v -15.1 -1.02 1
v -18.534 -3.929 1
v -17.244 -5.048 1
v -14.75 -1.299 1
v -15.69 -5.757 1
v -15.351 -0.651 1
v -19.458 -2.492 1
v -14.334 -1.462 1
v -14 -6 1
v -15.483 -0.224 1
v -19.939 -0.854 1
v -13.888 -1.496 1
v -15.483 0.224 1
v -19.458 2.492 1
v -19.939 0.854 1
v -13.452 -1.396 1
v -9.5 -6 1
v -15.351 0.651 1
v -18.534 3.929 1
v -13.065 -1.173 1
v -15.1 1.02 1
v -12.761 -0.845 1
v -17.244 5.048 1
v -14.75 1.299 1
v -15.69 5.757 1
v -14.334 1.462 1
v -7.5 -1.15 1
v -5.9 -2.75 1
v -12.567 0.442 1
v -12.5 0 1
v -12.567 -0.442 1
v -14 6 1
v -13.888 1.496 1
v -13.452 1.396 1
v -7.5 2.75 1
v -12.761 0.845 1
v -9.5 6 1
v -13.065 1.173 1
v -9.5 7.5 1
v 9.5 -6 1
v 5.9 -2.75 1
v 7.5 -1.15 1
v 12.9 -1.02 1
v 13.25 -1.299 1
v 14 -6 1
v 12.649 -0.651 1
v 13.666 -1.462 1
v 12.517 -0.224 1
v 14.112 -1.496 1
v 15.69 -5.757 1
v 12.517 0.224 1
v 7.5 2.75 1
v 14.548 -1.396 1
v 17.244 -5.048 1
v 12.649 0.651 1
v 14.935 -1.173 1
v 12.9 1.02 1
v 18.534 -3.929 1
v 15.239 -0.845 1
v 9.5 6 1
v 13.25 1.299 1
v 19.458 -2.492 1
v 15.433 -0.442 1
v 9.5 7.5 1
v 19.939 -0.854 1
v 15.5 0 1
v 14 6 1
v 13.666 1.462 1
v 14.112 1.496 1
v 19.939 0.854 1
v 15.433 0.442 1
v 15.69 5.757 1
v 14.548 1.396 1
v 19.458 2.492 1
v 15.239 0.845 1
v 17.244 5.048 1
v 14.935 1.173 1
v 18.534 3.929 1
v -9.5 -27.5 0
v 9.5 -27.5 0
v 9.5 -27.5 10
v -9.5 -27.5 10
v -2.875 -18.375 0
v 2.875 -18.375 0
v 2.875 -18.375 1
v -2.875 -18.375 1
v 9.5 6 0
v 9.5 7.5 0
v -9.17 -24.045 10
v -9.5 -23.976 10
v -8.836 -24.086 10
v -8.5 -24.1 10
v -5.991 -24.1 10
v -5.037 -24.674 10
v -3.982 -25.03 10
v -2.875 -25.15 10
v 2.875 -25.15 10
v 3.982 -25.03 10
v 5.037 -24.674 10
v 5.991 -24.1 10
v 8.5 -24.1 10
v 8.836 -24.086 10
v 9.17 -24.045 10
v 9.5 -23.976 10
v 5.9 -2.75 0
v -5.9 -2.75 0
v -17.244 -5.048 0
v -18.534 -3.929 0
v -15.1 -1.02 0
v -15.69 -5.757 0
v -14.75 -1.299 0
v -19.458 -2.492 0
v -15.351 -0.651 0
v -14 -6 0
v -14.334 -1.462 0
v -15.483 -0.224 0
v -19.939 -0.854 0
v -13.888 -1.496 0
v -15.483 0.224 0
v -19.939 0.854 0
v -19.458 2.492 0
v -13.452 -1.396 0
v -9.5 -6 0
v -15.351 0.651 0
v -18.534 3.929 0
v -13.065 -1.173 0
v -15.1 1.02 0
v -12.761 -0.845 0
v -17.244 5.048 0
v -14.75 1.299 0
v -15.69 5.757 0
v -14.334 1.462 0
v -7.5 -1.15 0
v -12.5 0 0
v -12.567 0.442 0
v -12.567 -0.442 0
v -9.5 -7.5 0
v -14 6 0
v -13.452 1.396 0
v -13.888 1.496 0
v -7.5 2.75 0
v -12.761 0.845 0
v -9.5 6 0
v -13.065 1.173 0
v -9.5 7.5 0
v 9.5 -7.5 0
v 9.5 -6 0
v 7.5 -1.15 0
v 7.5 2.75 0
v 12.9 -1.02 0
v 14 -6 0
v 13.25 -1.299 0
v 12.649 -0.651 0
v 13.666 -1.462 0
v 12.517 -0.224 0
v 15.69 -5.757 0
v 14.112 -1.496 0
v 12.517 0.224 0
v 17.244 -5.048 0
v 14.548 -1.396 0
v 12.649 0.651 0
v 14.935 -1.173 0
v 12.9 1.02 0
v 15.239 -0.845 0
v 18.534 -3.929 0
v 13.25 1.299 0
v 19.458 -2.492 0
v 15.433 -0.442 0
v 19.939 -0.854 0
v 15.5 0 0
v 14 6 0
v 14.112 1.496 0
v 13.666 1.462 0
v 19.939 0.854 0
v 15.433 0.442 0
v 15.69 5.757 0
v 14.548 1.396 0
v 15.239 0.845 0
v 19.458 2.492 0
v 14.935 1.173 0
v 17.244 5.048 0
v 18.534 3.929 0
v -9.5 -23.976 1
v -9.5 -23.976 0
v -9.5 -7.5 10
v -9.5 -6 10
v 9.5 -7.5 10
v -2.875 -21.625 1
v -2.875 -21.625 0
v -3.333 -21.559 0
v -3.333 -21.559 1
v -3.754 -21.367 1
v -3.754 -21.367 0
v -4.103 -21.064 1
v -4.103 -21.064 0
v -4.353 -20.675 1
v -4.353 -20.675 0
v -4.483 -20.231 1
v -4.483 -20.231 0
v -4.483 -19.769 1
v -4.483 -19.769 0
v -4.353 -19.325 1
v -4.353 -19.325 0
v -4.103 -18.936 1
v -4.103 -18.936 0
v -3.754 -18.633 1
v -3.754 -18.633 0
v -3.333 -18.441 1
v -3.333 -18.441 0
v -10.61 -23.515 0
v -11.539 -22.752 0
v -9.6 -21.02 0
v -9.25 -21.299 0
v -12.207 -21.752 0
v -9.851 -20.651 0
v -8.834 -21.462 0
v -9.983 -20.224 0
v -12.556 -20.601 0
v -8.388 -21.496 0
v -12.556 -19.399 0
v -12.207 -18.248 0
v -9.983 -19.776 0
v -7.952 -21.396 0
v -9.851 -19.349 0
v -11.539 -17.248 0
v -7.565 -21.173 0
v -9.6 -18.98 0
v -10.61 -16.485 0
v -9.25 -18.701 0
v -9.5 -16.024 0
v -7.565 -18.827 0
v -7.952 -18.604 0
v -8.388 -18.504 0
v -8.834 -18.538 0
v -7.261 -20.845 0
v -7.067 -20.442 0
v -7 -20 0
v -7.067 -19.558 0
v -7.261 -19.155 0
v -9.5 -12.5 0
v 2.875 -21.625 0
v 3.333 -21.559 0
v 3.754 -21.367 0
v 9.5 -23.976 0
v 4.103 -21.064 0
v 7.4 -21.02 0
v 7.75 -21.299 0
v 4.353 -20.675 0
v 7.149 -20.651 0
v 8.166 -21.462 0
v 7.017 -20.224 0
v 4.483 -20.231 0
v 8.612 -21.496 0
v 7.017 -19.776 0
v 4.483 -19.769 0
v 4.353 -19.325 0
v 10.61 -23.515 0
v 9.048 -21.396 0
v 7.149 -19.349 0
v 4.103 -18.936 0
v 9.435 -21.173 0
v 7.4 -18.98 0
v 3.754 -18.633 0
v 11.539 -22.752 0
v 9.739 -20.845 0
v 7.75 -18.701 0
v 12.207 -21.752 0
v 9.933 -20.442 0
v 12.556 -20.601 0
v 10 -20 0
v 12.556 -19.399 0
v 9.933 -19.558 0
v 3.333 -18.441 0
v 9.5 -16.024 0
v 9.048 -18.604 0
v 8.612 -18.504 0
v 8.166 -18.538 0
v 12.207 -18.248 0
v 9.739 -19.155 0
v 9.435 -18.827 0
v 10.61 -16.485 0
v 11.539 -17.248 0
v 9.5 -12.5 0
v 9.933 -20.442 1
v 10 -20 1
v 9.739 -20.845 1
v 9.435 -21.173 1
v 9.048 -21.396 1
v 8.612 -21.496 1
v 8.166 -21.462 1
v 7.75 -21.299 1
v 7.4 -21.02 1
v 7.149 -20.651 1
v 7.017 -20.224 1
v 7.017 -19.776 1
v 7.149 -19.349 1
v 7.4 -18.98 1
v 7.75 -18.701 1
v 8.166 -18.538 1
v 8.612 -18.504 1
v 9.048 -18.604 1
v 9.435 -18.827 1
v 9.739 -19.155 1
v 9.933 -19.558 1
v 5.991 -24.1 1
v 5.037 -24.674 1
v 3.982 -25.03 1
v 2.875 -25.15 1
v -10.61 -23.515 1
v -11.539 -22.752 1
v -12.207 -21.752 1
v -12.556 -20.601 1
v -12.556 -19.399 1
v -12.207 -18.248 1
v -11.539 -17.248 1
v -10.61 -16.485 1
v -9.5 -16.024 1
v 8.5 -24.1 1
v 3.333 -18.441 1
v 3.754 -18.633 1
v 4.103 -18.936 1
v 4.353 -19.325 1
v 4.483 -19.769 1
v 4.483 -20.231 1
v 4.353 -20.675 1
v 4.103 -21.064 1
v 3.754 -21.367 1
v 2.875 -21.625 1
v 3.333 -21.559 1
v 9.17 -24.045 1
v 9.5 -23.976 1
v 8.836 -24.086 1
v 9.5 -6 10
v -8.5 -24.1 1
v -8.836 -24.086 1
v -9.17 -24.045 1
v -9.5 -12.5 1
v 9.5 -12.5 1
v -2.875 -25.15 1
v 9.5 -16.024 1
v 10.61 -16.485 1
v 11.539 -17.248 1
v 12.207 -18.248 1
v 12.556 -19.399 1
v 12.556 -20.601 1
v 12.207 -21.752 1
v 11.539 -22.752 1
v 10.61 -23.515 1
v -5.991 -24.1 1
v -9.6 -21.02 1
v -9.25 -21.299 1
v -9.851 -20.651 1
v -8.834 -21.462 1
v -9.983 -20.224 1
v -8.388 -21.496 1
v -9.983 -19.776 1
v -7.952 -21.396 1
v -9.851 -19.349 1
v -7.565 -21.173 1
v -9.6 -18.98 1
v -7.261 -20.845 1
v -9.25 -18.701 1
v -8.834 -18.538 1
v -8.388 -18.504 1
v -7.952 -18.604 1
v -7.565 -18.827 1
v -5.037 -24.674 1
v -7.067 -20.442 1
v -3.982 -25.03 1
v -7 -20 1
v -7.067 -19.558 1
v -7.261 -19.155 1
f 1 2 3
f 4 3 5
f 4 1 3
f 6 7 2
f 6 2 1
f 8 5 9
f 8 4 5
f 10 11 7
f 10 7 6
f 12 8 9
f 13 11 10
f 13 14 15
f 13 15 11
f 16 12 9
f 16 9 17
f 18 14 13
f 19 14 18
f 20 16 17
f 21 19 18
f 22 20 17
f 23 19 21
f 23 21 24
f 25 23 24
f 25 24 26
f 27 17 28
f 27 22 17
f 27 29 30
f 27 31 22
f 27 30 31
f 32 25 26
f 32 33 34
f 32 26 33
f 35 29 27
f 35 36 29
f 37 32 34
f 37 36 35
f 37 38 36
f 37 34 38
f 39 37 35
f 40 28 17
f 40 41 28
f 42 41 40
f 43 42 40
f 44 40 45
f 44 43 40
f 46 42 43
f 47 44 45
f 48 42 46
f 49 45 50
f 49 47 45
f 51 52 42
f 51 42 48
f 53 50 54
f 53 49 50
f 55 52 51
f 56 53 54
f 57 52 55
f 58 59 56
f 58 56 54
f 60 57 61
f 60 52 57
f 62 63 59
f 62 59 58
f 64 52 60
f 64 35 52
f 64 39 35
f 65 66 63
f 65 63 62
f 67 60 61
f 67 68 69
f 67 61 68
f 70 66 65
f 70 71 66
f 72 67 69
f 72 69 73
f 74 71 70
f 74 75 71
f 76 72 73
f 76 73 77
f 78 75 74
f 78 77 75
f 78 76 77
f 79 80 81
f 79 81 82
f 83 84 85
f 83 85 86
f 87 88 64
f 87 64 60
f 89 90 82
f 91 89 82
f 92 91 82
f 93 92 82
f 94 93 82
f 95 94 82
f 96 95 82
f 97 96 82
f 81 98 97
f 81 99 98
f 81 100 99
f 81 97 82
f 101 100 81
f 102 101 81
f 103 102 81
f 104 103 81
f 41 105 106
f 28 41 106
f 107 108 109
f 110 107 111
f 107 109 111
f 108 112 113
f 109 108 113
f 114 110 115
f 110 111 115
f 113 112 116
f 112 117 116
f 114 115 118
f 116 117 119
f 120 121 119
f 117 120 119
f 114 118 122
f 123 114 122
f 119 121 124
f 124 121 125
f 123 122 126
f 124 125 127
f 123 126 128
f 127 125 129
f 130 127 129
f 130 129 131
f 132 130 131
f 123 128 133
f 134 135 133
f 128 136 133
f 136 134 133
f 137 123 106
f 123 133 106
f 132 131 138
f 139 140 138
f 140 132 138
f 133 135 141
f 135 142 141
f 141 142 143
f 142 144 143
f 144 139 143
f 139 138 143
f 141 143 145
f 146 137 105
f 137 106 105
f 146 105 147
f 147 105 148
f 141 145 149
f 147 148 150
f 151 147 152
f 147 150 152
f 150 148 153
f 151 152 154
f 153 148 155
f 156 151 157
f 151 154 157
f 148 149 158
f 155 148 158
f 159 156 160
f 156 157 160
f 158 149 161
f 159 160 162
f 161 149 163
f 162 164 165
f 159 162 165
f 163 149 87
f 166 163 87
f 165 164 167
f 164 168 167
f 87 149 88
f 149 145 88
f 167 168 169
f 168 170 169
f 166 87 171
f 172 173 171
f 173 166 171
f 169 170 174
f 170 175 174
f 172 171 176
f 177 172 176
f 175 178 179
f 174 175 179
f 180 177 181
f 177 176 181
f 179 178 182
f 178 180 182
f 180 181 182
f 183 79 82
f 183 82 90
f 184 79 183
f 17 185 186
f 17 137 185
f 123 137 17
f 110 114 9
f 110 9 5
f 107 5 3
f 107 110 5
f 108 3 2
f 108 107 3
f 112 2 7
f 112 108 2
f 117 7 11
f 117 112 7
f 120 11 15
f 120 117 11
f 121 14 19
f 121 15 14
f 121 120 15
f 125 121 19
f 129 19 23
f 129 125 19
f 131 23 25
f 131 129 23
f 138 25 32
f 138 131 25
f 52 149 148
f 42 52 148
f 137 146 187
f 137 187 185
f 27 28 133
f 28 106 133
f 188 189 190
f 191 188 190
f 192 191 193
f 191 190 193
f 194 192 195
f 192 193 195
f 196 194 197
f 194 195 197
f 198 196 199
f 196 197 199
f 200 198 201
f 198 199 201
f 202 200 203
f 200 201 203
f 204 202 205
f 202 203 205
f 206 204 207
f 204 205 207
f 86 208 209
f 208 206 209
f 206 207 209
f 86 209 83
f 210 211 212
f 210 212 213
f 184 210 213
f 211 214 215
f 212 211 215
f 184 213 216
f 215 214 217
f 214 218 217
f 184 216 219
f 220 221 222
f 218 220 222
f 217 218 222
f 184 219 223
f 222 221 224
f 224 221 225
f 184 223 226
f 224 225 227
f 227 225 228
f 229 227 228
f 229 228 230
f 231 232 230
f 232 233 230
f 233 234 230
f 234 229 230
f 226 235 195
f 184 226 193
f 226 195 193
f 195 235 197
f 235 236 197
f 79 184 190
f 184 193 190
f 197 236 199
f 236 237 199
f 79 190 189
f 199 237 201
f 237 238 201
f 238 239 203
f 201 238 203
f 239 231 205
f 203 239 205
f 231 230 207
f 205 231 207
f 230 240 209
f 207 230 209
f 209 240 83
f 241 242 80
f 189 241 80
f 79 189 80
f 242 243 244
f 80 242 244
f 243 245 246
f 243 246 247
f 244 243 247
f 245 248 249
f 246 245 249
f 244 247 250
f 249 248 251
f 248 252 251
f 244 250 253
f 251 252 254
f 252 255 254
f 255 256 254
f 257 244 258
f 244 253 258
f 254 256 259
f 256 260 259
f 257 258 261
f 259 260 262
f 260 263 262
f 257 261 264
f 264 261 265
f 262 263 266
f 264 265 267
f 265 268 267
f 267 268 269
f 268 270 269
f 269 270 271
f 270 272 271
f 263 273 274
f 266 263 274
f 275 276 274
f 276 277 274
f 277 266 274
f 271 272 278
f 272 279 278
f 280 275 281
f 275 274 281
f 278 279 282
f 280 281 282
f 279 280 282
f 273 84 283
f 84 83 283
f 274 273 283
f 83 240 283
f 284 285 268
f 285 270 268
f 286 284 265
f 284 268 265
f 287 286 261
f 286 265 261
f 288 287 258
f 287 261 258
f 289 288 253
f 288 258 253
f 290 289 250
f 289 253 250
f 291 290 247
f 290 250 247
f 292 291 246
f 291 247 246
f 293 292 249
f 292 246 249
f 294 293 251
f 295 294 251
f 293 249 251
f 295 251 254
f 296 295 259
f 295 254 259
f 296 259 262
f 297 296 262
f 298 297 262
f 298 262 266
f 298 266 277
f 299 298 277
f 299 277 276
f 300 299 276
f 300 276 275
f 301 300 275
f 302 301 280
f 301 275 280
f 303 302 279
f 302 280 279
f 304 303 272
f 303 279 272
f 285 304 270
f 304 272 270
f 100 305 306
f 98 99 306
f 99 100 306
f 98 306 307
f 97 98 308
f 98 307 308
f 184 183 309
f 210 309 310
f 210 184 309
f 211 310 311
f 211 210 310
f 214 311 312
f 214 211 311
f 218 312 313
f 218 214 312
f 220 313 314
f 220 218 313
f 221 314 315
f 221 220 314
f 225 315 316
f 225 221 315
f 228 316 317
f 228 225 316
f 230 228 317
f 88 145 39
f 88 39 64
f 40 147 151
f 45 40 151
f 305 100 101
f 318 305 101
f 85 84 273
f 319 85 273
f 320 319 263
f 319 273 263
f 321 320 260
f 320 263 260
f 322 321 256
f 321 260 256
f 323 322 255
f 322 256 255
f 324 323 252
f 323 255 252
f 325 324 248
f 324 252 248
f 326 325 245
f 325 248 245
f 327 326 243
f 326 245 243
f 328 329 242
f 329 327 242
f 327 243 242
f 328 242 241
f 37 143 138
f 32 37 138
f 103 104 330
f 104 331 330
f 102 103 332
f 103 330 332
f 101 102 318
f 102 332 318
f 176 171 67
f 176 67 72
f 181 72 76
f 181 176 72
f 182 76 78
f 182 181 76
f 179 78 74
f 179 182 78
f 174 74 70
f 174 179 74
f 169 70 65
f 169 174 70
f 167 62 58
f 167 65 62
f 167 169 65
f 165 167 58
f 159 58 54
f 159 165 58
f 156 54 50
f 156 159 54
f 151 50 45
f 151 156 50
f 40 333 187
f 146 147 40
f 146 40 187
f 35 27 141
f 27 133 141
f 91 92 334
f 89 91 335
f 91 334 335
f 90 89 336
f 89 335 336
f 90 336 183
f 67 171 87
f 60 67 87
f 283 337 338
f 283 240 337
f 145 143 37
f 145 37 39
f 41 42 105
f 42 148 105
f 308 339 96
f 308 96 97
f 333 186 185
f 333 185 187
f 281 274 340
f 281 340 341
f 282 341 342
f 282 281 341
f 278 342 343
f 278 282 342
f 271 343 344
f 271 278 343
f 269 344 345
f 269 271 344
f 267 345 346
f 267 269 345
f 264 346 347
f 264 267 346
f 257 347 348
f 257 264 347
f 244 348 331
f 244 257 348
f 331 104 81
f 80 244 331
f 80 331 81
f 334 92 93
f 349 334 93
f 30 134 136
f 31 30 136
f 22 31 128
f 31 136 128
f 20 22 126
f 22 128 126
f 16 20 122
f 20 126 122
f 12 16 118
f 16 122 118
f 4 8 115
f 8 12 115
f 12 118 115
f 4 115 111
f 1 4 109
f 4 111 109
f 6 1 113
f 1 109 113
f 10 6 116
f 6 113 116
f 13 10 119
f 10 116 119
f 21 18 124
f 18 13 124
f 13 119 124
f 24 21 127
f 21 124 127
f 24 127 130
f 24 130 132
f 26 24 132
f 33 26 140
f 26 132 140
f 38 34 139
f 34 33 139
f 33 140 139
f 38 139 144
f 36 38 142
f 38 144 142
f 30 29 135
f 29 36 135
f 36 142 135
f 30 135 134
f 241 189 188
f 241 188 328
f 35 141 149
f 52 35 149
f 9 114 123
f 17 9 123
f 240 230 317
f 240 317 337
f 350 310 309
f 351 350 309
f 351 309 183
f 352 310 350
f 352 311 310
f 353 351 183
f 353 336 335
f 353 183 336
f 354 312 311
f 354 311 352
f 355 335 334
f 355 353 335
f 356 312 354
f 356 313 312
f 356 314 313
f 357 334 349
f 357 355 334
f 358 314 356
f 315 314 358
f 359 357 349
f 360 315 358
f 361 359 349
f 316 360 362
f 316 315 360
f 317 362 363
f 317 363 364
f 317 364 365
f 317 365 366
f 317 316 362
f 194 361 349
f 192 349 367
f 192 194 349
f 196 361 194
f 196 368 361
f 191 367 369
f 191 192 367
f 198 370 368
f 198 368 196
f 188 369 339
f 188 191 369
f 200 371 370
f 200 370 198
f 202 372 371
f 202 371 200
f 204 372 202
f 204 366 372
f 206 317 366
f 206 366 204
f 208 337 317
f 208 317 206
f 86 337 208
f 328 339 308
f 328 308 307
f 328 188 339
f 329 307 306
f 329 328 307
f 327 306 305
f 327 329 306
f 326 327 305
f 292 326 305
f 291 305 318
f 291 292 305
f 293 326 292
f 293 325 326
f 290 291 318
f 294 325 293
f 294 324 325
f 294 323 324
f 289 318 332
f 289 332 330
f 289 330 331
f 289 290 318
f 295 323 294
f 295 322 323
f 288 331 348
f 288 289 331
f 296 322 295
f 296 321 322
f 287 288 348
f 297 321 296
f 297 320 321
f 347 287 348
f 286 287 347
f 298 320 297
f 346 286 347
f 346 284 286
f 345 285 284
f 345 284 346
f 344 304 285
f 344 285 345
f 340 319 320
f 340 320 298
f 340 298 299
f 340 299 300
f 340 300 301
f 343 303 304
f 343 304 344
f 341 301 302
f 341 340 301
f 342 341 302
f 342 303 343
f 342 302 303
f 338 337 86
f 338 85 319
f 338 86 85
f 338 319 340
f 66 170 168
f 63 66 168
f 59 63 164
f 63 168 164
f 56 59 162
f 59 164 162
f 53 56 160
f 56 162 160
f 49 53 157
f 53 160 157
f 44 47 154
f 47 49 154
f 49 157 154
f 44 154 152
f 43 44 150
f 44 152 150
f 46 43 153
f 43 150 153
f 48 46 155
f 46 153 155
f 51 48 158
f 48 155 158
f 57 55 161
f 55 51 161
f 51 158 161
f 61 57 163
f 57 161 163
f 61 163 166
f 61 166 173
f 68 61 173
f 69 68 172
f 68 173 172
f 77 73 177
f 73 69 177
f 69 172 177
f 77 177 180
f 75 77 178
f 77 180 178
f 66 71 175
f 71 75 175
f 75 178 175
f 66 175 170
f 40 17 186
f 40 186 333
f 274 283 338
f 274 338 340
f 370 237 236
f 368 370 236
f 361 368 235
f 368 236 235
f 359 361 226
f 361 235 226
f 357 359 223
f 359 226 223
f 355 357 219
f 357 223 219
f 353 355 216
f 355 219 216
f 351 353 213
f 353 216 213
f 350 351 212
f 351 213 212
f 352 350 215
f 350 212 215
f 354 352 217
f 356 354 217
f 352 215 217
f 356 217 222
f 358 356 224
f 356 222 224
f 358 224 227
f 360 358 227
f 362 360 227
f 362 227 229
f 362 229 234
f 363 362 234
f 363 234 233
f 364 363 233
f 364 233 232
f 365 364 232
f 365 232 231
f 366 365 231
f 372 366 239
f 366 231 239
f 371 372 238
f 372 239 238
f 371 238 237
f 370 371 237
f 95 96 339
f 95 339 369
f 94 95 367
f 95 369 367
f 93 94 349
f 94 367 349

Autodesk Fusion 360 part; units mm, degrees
sketch "Sketch1" plane through (0, 0, 0) normal (0, 0, 1) x (1, 0, 0)
  line L0 (-14, 0) -> (14, 0) construction
  line L1 (-14, -6) -> (14, -6)
  arc A0 (14, -6) -> (14, 6) centre (14, 0) ccw
  line L2 (14, 6) -> (-14, 6)
  arc A1 (-14, 6) -> (-14, -6) centre (-14, 0) ccw
  line L3 (-14, 0) -> (14, 0) construction
  line L4 (-7.5, 2.75) -> (7.5, 2.75)
  line L5 (7.5, 2.75) -> (7.5, -1.15)
  line L6 (7.5, -1.15) -> (5.9, -2.75)
  line L7 (5.9, -2.75) -> (-5.9, -2.75)
  line L8 (-5.9, -2.75) -> (-7.5, -1.15)
  line L9 (-7.5, -1.15) -> (-7.5, 2.75)
  circle A2 centre (-14, 0) radius 1.5
  circle A3 centre (14, 0) radius 1.5
  line L10 (-9.5, 7.5) -> (9.5, 7.5)
  line L11 (9.5, 7.5) -> (9.5, -7.5)
  line L12 (9.5, -7.5) -> (-9.5, -7.5)
  line L13 (-9.5, -7.5) -> (-9.5, 7.5)
  point P0 (0, 2.75)
  dimension "d1" = 28
  dimension "d2" = 6
  dimension "d3" = 15
  dimension "d4" = 5.5
  dimension "d5" = 3.9
  dimension "d6" = 2.75
  dimension "d7" = 3
  dimension "d8" = 3
  dimension "d21" = 15
  dimension "d22" = 7.5
  dimension "d23" = 19
  dimension "d24" = 9.5
extrude "Extrude1" add sketch "Sketch1" along normal blind 1 contours L1 L2 A1 L13 | L1 L2 L11 L13 | L1 A0 L2 L11 | L2 L10 L11 L13 makes body 1
extrude "Extrude3" add sketch "Sketch1" along normal blind 10 contours L1 L11 L12 L13 bodies 1
sketch "Sketch2" plane through (0, 0, 0) normal (0, 0, 1) x (1, 0, 0)
  line L0 (-8.5, -24.1) -> (8.5, -24.1)
  arc A0 (8.5, -24.1) -> (8.5, -15.9) centre (8.5, -20) ccw
  line L1 (8.5, -15.9) -> (-8.5, -15.9)
  arc A1 (-8.5, -15.9) -> (-8.5, -24.1) centre (-8.5, -20) ccw
  line L2 (-8.5, -20) -> (8.5, -20) construction
  line L3 (-2.875, -21.625) -> (2.875, -21.625)
  arc A2 (2.875, -21.625) -> (2.875, -18.375) centre (2.875, -20) ccw
  line L4 (2.875, -18.375) -> (-2.875, -18.375)
  arc A3 (-2.875, -18.375) -> (-2.875, -21.625) centre (-2.875, -20) ccw
  line L5 (-2.875, -20) -> (2.875, -20) construction
  line L6 (4.5, -17.2515) -> (4.5, -22.6673) construction
  line L7 (-2.875, -25.15) -> (2.875, -25.15)
  arc A4 (2.875, -25.15) -> (2.875, -14.85) centre (2.875, -20) ccw
  line L8 (2.875, -14.85) -> (-2.875, -14.85)
  arc A5 (-2.875, -14.85) -> (-2.875, -25.15) centre (-2.875, -20) ccw
  line L9 (-2.875, -20) -> (2.875, -20) construction
  circle A6 centre (8.5, -20) radius 1.5
  circle A7 centre (-8.5, -20) radius 1.5
  line L10 (-9.5, -12.5) -> (9.5, -12.5)
  line L11 (9.5, -12.5) -> (9.5, -27.5)
  line L12 (9.5, -27.5) -> (-9.5, -27.5)
  line L13 (-9.5, -27.5) -> (-9.5, -12.5)
  point P0 (0, -20)
  point P1 (0, -20)
  dimension "d11" = 17
  dimension "d12" = 4.1
  dimension "d13" = 20
  dimension "d14" = 3.25
  dimension "d15" = 4.5
  dimension "d16" = 10.3
  dimension "d17" = 3
  dimension "d18" = 3
  dimension "d25" = 19
  dimension "d26" = 9.5
  dimension "d27" = 15
  dimension "d28" = 7.5
extrude "Extrude2" add sketch "Sketch2" along normal blind 1 separate body contours L0 A1 A5 A7 L13 | L0 L1 A4 A5 A6 A7 | L0 L7 A4 A5 | A1 A7 L13 | L0 A0 A4 A6 L11 | A0 L1 A1 A4 L8 A5 L10 L11 L13 | L1 A1 A5 A7 L13 | A0 A6 L11 | A0 L1 A4 A6 L11 | L1 A4 L8 A5 makes body 2
extrude "Extrude4" add sketch "Sketch2" along normal up to surface (10 mm away) contours L0 A0 A1 L7 A4 A5 L11 L12 L13 bodies 2
equation "d6 = d4 / 2"
equation "d22 = d21 / 2"
equation "d24 = d23 / 2"
equation "d26 = d25 / 2"
equation "d28 = d27 / 2"
